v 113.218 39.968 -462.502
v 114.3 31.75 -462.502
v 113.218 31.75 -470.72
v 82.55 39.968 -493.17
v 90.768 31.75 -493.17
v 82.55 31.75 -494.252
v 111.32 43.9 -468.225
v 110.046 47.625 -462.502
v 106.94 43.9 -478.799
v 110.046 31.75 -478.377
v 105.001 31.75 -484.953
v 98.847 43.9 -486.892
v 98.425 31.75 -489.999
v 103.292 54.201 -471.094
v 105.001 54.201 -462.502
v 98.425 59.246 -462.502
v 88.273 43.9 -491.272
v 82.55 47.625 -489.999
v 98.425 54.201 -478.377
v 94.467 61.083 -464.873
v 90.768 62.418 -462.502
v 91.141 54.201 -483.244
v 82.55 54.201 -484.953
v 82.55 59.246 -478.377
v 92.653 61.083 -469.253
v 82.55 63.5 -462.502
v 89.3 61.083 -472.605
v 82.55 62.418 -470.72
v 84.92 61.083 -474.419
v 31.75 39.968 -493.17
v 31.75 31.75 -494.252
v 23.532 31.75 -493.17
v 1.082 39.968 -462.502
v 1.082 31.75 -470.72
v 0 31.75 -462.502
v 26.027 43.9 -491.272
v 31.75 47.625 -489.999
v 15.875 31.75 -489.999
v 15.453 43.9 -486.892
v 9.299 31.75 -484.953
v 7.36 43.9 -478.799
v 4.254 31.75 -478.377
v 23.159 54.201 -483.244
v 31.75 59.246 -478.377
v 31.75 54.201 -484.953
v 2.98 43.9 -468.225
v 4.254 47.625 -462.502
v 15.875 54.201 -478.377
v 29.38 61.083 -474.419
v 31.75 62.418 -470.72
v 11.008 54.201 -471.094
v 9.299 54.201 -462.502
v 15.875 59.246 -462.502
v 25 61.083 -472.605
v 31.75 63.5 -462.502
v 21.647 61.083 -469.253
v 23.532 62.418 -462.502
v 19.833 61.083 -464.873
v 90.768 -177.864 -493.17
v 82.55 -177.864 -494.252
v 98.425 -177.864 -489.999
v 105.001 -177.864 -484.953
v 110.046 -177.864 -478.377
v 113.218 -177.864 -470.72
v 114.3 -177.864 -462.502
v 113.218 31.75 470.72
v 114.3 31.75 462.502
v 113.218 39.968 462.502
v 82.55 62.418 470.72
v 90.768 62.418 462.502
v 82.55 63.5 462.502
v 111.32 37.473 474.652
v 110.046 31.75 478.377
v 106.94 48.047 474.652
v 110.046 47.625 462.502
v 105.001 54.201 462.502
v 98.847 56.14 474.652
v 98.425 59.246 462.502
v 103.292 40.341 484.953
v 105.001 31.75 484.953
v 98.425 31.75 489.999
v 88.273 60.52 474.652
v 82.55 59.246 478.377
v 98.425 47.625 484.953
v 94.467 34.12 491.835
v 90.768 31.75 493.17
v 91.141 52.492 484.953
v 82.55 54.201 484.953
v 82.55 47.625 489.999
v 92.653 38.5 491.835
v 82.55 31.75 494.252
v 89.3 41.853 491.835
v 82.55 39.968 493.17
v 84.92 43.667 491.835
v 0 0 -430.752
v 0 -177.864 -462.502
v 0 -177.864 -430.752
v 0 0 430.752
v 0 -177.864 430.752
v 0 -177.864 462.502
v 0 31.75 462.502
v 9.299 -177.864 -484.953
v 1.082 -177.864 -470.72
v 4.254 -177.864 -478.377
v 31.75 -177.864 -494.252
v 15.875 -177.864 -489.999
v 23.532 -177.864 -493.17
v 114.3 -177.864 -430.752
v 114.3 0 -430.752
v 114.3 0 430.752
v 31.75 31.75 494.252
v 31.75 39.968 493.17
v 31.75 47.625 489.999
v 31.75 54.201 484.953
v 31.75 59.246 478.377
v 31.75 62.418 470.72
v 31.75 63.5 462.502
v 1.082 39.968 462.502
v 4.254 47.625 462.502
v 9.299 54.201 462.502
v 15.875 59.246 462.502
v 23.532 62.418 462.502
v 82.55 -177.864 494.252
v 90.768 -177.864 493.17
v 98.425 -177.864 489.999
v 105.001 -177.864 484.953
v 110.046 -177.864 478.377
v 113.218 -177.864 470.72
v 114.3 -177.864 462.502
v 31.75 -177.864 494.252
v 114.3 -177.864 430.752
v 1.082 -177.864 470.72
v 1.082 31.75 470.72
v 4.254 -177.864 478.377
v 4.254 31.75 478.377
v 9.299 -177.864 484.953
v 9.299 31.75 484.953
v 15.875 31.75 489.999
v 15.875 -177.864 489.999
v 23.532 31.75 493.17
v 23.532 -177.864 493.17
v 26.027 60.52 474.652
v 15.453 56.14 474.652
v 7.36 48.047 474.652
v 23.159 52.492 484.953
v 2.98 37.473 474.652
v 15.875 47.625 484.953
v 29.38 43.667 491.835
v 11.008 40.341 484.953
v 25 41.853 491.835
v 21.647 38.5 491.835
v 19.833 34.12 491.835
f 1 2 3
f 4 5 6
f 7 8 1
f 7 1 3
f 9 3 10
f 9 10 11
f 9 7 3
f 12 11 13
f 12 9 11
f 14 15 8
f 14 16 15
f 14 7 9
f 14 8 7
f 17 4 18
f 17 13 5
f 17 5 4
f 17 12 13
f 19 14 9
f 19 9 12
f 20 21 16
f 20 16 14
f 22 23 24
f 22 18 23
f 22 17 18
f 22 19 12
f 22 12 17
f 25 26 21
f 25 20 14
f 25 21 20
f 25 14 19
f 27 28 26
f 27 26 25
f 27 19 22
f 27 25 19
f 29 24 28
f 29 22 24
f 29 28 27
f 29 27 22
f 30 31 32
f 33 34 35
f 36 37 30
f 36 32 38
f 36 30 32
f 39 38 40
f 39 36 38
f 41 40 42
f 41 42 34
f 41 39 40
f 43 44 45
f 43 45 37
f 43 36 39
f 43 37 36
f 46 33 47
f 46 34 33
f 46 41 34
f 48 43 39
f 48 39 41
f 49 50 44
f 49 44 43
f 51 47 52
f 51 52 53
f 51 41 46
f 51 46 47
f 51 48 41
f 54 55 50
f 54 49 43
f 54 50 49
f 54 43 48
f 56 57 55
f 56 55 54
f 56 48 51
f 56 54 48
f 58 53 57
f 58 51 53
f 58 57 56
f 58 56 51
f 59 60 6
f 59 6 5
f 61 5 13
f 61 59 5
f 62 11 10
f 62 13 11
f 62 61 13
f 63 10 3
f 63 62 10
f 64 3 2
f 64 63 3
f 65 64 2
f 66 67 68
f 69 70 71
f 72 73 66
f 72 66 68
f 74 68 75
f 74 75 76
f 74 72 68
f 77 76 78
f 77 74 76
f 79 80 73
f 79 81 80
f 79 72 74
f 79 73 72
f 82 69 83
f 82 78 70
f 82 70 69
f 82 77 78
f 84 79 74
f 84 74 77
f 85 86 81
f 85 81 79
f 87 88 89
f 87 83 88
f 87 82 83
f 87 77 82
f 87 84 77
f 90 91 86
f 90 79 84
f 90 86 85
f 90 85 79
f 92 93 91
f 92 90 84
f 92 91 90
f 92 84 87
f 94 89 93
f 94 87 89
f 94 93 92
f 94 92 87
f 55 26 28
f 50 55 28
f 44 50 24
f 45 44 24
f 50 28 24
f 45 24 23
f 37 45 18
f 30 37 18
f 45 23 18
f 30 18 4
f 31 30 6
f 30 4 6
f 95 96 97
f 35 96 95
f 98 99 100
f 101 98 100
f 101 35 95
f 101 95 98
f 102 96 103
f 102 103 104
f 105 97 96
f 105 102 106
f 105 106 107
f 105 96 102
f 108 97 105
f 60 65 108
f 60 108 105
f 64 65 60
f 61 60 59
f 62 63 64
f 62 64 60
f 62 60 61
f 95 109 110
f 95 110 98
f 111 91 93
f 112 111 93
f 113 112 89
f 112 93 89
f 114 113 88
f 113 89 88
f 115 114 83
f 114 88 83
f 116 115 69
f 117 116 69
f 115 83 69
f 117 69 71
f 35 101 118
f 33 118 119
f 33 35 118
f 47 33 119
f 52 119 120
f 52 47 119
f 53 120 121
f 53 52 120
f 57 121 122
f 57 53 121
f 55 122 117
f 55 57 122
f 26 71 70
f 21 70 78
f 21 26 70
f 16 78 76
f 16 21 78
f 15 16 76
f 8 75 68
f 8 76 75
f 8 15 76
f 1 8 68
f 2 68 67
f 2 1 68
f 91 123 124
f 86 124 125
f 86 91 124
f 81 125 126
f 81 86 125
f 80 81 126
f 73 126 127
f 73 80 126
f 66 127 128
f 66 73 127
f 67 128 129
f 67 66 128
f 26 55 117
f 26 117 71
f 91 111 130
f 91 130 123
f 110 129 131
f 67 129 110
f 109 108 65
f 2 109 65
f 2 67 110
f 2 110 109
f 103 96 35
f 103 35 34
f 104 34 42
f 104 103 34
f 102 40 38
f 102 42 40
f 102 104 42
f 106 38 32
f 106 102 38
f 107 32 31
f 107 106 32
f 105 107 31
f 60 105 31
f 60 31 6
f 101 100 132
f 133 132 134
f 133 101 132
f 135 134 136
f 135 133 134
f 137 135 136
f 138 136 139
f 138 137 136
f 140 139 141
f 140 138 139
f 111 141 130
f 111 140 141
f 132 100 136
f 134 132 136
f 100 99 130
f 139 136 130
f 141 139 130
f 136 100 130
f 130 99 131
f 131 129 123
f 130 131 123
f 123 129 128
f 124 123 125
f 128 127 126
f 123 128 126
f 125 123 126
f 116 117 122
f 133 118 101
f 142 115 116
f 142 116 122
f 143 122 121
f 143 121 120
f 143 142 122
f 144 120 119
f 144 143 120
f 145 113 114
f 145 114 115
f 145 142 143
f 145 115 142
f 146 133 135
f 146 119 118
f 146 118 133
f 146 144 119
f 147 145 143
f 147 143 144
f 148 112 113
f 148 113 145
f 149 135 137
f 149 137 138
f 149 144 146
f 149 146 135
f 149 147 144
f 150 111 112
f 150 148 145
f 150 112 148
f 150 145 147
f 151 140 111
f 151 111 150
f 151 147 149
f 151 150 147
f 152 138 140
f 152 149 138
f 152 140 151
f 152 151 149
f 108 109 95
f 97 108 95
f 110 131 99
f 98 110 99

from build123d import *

# Parameters (mm, degrees)
FILLET1_R = 31.75


with BuildPart() as part:
    # Sweep2: sweep along a path in Sketch1
    with BuildLine(Plane(origin=(0, 0, 0), x_dir=(0, 0, -1), z_dir=(1, 0, 0))) as sweep2_path:
        Line((-430.75225, -177.8635), (-430.75225, 0))
        Line((-430.75225, 0), (430.75225, 0))
        Line((430.75225, 0), (430.75225, -177.8635))
    # Sketch2 → Sweep2 (sweep)
    with BuildSketch(Plane(origin=(0, 0, 0), x_dir=(1, 0, 0), z_dir=(0, 1, 0))):
        with BuildLine():
            Line((0, -430.75225), (114.3, -430.75225))
            Line((114.3, -430.75225), (114.3, -462.50225))
            ThreePointArc((114.3, -462.50225), (105.000640303, -484.952890303), (82.55, -494.25225))
            Line((82.55, -494.25225), (31.75, -494.25225))
            ThreePointArc((31.75, -494.25225), (9.299359697, -484.952890303), (0, -462.50225))
            Line((0, -462.50225), (0, -430.75225))
        make_face()
    sweep(path=sweep2_path.line, transition=Transition.RIGHT)

    # Fillet1
    # the kernel refuses this fillet: 31.75 mm, written as the material it takes off along each edge
    with BuildSketch(Plane(origin=(82.55, 31.75, -462.50225), x_dir=(0, 0, -1), z_dir=(0, 1, 0))) as fillet1_piece_1_section:
        Polygon((0, 0), (FILLET1_R * 1.02, 0), (FILLET1_R * 1.02, -FILLET1_R * 1.02), (0, -FILLET1_R * 1.02), align=None)
    fillet1_piece_1 = extrude(amount=FILLET1_R * 1.02, mode=Mode.PRIVATE)
    fillet1_piece_1 = fillet1_piece_1 - Plane(origin=(82.55, 31.75, -462.50225), x_dir=(-0.7071067811865477, 0, 0.7071067811865474), z_dir=(0, 1, 0)) * Sphere(FILLET1_R, mode=Mode.PRIVATE)
    add(fillet1_piece_1, mode=Mode.SUBTRACT)
    with BuildSketch(Plane(origin=(31.75, 31.75, -462.50225), x_dir=(0, 0, -1), z_dir=(0, 1, 0))) as fillet1_piece_2_section:
        Polygon((0, 0), (FILLET1_R * 1.02, 0), (FILLET1_R * 1.02, FILLET1_R * 1.02), (0, FILLET1_R * 1.02), align=None)
    fillet1_piece_2 = extrude(amount=FILLET1_R * 1.02, mode=Mode.PRIVATE)
    fillet1_piece_2 = fillet1_piece_2 - Plane(origin=(31.75, 31.75, -462.50225), x_dir=(0.7071067811865475, 0, 0.7071067811865475), z_dir=(0, 1, 0)) * Sphere(FILLET1_R, mode=Mode.PRIVATE)
    add(fillet1_piece_2, mode=Mode.SUBTRACT)
    with BuildSketch(Plane(origin=(31.75, 31.75, 462.50225), x_dir=(0, 1, 0), z_dir=(0, 0, 1))) as fillet1_piece_3_section:
        Polygon((0, 0), (FILLET1_R * 1.02, 0), (FILLET1_R * 1.02, FILLET1_R * 1.02), (0, FILLET1_R * 1.02), align=None)
    fillet1_piece_3 = extrude(amount=FILLET1_R * 1.02, mode=Mode.PRIVATE)
    fillet1_piece_3 = fillet1_piece_3 - Plane(origin=(31.75, 31.75, 462.50225), x_dir=(0.7071067811865477, -0.7071067811865475, 0), z_dir=(0, 0, 1)) * Sphere(FILLET1_R, mode=Mode.PRIVATE)
    add(fillet1_piece_3, mode=Mode.SUBTRACT)
    with BuildSketch(Plane(origin=(82.55, 31.75, 462.50225), x_dir=(0, 1, 0), z_dir=(0, 0, 1))) as fillet1_piece_4_section:
        Polygon((0, 0), (FILLET1_R * 1.02, 0), (FILLET1_R * 1.02, -FILLET1_R * 1.02), (0, -FILLET1_R * 1.02), align=None)
    fillet1_piece_4 = extrude(amount=FILLET1_R * 1.02, mode=Mode.PRIVATE)
    fillet1_piece_4 = fillet1_piece_4 - Plane(origin=(82.55, 31.75, 462.50225), x_dir=(-0.7071067811865475, -0.7071067811865476, 0), z_dir=(0, 0, 1)) * Sphere(FILLET1_R, mode=Mode.PRIVATE)
    add(fillet1_piece_4, mode=Mode.SUBTRACT)
    with BuildSketch(Plane(origin=(82.55, 63.5, -494.25225), x_dir=(0, 0, 1), z_dir=(-1, 0, 0)), Plane(origin=(82.55, 63.5, 494.25225), x_dir=(0, -1, 0), z_dir=(-1, 0, 0))) as fillet1_piece_5:
        with BuildLine():
            CenterArc((FILLET1_R, -FILLET1_R), FILLET1_R, 90, 90)
            Line((0, -FILLET1_R), (0, 0))
            Line((0, 0), (FILLET1_R, 0))
        make_face()
    extrude(amount=50.8, mode=Mode.SUBTRACT)


solid = part.part
